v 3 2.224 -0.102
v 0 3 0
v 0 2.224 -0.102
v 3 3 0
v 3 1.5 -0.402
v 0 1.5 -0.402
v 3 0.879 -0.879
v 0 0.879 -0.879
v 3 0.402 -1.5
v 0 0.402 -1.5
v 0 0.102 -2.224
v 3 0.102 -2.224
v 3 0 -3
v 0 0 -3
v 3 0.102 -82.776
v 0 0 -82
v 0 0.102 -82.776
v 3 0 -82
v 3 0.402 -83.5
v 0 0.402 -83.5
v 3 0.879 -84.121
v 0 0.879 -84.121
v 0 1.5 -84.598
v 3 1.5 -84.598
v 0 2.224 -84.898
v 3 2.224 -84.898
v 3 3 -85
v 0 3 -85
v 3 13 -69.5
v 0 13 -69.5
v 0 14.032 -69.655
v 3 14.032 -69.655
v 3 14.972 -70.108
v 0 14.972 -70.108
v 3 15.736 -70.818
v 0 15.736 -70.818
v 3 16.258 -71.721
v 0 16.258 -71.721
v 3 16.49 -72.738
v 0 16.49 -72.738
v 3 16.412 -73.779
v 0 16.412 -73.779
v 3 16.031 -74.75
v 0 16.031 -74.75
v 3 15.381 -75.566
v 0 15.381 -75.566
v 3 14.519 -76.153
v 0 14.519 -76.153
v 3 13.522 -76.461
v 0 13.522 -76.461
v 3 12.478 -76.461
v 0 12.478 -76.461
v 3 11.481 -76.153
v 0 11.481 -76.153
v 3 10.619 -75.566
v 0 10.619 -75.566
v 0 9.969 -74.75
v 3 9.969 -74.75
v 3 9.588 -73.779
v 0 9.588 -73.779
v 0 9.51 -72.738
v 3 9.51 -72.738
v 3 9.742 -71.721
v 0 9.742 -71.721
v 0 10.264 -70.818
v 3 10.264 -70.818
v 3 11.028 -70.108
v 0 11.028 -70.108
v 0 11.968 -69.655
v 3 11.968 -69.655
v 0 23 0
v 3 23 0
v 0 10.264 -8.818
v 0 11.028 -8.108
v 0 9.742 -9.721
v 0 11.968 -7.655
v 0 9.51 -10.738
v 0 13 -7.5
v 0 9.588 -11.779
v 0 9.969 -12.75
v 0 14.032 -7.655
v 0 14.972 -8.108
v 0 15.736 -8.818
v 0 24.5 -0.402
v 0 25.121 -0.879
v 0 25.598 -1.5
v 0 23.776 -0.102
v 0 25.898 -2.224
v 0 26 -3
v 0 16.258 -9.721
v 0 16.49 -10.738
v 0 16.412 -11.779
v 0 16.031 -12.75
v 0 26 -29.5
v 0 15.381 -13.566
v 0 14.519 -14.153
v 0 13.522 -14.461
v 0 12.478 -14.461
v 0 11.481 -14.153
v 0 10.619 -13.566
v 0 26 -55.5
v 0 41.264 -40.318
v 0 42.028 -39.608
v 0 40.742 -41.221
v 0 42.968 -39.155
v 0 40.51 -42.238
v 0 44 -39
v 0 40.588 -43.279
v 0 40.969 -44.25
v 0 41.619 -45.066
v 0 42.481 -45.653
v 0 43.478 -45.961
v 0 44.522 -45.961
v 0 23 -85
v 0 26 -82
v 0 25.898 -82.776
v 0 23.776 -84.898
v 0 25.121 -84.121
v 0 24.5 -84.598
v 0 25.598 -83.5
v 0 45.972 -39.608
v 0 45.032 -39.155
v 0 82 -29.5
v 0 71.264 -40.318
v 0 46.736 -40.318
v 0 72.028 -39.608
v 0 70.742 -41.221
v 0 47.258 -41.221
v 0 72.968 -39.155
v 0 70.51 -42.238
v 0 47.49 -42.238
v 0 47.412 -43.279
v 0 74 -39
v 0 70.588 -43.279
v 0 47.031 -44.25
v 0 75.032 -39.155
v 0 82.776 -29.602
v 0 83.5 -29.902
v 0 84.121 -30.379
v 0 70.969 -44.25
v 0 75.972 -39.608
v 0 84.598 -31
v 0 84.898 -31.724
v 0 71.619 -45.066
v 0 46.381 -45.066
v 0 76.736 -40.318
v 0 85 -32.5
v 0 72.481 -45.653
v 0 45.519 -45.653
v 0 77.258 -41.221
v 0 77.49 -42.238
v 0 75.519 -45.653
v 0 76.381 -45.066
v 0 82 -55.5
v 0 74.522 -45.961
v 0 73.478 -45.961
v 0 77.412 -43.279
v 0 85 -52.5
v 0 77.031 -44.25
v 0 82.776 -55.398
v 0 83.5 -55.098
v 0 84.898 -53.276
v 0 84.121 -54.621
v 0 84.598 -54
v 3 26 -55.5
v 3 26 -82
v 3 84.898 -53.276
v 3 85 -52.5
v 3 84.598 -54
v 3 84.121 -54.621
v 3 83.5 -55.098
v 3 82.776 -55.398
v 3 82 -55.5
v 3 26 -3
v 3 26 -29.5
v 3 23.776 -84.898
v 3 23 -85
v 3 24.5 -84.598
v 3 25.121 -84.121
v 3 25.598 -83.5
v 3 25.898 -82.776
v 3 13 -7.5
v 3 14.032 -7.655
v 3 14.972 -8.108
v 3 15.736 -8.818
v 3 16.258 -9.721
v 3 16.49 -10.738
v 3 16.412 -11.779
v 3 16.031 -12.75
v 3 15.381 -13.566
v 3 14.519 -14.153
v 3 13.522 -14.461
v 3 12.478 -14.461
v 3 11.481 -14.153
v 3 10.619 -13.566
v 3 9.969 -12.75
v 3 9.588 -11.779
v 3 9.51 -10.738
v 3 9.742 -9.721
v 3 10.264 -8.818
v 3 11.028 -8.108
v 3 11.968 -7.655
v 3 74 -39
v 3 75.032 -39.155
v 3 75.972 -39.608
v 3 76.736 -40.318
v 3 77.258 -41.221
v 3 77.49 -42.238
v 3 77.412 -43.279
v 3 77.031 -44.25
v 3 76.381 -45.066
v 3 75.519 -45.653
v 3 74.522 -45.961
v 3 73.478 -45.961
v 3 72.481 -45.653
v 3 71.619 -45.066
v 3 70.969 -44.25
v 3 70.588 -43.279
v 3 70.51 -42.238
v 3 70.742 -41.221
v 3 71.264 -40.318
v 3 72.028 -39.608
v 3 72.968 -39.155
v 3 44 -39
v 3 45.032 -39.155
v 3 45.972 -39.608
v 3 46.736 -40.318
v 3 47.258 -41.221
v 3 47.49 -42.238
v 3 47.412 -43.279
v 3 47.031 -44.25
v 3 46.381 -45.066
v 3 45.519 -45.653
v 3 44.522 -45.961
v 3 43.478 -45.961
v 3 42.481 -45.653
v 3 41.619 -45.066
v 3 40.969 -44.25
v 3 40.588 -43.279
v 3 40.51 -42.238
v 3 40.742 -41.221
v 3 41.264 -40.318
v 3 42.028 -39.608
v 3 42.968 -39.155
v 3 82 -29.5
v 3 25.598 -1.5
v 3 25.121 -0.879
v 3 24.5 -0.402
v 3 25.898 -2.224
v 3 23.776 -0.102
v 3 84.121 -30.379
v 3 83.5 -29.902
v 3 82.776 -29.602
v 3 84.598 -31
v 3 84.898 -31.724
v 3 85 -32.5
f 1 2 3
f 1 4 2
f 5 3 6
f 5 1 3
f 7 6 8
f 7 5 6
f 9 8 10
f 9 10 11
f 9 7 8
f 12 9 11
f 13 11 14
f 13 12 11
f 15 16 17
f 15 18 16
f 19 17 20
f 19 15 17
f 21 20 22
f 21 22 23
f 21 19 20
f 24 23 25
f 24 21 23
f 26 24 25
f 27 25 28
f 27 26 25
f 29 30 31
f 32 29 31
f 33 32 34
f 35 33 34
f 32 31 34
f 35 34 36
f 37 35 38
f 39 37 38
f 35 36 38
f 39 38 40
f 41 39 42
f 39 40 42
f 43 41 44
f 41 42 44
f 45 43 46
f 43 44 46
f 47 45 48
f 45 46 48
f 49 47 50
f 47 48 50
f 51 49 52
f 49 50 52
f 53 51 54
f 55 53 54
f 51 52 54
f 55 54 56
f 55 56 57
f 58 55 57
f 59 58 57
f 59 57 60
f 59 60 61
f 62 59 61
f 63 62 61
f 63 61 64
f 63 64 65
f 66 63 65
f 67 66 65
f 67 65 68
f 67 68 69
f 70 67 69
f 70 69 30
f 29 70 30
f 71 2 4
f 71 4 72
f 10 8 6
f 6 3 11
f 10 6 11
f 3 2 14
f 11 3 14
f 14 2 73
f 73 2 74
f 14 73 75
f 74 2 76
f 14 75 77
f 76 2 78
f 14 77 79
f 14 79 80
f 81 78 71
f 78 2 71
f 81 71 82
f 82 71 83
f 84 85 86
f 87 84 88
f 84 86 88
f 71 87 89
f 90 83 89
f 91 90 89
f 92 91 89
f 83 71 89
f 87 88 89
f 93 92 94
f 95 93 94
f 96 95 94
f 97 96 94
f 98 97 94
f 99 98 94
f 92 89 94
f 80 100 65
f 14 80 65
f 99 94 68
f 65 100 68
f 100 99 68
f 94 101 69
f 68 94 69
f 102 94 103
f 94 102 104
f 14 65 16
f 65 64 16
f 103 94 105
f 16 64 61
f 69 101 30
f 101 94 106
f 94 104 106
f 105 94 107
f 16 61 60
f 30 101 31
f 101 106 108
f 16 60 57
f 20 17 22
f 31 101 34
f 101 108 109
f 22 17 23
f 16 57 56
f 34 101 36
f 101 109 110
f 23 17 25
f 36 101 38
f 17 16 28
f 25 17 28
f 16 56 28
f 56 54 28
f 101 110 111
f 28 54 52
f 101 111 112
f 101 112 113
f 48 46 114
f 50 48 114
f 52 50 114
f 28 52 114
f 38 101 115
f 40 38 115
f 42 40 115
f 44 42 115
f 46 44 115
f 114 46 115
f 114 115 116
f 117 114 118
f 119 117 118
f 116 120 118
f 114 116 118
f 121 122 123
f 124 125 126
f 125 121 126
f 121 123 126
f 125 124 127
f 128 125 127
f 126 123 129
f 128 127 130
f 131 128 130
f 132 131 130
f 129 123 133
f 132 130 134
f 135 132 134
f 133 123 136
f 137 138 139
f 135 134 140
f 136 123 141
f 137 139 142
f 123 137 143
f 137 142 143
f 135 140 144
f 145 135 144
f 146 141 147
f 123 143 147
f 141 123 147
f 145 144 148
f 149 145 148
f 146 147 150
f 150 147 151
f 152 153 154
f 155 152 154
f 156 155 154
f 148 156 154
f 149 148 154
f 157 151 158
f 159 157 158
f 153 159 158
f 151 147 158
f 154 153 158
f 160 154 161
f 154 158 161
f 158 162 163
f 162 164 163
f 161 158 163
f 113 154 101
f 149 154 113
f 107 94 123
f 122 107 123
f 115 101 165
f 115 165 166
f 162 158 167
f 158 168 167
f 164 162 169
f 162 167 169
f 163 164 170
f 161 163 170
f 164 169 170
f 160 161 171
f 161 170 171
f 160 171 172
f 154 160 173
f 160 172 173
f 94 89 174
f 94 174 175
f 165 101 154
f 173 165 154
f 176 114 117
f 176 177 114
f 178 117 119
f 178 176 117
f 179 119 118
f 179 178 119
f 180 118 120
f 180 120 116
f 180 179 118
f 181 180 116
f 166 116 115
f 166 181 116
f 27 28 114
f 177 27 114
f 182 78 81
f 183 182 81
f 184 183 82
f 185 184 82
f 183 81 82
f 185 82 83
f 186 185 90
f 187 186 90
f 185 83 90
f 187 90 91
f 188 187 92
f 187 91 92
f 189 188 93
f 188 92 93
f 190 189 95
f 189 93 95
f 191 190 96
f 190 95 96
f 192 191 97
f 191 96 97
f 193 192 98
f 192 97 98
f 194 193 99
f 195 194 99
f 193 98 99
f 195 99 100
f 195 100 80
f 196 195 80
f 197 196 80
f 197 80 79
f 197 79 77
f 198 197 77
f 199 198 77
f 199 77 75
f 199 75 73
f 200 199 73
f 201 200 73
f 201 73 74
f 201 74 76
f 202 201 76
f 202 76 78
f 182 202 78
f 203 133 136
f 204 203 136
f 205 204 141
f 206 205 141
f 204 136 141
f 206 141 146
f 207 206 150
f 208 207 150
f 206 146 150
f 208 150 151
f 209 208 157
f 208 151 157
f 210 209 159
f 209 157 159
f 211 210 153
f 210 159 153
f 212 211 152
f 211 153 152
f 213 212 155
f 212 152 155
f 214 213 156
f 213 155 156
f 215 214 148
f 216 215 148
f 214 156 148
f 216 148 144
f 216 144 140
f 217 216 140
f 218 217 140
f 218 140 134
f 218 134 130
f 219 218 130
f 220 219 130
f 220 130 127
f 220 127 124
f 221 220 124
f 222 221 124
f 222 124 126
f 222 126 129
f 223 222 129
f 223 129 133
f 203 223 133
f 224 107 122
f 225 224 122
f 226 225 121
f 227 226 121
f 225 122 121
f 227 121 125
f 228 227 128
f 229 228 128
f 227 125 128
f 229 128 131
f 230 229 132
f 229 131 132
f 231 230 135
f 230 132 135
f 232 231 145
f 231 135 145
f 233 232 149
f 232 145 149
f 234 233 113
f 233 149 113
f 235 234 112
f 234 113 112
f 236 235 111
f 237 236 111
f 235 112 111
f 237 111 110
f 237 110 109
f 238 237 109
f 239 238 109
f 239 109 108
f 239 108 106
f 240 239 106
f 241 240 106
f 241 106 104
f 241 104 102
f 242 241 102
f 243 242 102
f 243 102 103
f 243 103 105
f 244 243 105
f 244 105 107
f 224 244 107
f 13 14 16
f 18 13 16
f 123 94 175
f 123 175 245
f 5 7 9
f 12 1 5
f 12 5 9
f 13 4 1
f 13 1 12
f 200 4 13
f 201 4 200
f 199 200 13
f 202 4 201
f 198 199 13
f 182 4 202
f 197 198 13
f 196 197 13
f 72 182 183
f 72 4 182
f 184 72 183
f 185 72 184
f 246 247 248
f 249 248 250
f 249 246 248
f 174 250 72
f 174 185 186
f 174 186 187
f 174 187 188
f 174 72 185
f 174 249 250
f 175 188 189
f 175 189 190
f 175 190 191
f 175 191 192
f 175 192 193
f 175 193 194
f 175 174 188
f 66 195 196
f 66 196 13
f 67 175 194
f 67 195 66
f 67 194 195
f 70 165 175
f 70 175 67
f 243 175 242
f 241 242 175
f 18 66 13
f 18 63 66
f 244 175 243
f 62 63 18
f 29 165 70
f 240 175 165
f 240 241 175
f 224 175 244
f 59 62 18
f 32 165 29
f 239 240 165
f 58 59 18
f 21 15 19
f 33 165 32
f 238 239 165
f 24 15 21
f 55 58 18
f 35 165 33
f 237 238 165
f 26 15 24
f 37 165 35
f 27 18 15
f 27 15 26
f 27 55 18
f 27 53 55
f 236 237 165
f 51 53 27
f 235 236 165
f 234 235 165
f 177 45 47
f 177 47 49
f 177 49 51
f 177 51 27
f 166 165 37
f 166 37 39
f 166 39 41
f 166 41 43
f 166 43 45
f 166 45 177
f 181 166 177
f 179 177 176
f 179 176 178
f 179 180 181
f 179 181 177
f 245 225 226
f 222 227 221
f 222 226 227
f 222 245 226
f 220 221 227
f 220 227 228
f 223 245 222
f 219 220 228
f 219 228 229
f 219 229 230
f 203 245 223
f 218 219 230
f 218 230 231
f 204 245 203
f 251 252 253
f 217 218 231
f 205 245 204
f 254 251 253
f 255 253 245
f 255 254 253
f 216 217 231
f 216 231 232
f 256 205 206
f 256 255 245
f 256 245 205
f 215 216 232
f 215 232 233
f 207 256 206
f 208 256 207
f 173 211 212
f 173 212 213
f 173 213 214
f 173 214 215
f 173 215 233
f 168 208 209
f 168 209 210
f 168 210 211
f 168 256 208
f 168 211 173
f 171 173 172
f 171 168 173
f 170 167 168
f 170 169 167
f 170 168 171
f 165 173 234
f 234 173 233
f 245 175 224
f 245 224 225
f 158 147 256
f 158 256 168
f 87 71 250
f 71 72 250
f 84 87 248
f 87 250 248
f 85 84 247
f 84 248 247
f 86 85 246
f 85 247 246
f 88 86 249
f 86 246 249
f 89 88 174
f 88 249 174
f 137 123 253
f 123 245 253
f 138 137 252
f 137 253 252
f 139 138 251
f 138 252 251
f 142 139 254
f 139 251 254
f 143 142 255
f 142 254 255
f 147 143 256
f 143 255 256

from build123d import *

# Parameters (mm, degrees)
SKETCH1_W           = 85
SKETCH1_H           = 85
BOSS_EXTRUDE1_DEPTH = 3
SKETCH5_W           = 29.5
SKETCH5_H           = 59
CUT_EXTRUDE2_DEPTH  = 4
DIAMETERHOLE2_D     = 7
FILLET2_R           = 3


with BuildPart() as part:
    # Sketch1 → Boss-Extrude1 (new body)
    with BuildSketch(Plane(origin=(0, 0, 0), x_dir=(0, 0, -1), z_dir=(1, 0, 0))):
        with Locations((42.5, 42.5)):
            Rectangle(SKETCH1_W, SKETCH1_H)
    extrude(amount=BOSS_EXTRUDE1_DEPTH)

    # Sketch5 → Cut-Extrude2 (cut, through all)
    with BuildSketch(Plane(origin=(0, 0, 0), x_dir=(0, 0, -1), z_dir=(1, 0, 0))):
        with Locations((14.75, 55.5)):
            Rectangle(SKETCH5_W, SKETCH5_H)
        with Locations((70.25, 55.5)):
            Rectangle(SKETCH5_W, SKETCH5_H)
    extrude(amount=CUT_EXTRUDE2_DEPTH, mode=Mode.SUBTRACT)

    # DiameterHole2 (through all)
    with Locations(Plane(origin=(3, 0, 0), x_dir=(0, 0, -1), z_dir=(1, 0, 0))):
        with Locations((42.5, 74), (42.5, 44), (11, 13), (73, 13)):
            Hole(DIAMETERHOLE2_D / 2)

    # Fillet2
    fillet2_edges = [part.edges().sort_by_distance(p)[0] for p in [
        (1.5, 26, 0),
        (1.5, 85, -29.5),
        (1.5, 26, -85),
        (1.5, 85, -55.5),
        (1.5, 0, -85),
        (1.5, 0, 0),
    ]]
    fillet(fillet2_edges, radius=FILLET2_R)


solid = part.part
